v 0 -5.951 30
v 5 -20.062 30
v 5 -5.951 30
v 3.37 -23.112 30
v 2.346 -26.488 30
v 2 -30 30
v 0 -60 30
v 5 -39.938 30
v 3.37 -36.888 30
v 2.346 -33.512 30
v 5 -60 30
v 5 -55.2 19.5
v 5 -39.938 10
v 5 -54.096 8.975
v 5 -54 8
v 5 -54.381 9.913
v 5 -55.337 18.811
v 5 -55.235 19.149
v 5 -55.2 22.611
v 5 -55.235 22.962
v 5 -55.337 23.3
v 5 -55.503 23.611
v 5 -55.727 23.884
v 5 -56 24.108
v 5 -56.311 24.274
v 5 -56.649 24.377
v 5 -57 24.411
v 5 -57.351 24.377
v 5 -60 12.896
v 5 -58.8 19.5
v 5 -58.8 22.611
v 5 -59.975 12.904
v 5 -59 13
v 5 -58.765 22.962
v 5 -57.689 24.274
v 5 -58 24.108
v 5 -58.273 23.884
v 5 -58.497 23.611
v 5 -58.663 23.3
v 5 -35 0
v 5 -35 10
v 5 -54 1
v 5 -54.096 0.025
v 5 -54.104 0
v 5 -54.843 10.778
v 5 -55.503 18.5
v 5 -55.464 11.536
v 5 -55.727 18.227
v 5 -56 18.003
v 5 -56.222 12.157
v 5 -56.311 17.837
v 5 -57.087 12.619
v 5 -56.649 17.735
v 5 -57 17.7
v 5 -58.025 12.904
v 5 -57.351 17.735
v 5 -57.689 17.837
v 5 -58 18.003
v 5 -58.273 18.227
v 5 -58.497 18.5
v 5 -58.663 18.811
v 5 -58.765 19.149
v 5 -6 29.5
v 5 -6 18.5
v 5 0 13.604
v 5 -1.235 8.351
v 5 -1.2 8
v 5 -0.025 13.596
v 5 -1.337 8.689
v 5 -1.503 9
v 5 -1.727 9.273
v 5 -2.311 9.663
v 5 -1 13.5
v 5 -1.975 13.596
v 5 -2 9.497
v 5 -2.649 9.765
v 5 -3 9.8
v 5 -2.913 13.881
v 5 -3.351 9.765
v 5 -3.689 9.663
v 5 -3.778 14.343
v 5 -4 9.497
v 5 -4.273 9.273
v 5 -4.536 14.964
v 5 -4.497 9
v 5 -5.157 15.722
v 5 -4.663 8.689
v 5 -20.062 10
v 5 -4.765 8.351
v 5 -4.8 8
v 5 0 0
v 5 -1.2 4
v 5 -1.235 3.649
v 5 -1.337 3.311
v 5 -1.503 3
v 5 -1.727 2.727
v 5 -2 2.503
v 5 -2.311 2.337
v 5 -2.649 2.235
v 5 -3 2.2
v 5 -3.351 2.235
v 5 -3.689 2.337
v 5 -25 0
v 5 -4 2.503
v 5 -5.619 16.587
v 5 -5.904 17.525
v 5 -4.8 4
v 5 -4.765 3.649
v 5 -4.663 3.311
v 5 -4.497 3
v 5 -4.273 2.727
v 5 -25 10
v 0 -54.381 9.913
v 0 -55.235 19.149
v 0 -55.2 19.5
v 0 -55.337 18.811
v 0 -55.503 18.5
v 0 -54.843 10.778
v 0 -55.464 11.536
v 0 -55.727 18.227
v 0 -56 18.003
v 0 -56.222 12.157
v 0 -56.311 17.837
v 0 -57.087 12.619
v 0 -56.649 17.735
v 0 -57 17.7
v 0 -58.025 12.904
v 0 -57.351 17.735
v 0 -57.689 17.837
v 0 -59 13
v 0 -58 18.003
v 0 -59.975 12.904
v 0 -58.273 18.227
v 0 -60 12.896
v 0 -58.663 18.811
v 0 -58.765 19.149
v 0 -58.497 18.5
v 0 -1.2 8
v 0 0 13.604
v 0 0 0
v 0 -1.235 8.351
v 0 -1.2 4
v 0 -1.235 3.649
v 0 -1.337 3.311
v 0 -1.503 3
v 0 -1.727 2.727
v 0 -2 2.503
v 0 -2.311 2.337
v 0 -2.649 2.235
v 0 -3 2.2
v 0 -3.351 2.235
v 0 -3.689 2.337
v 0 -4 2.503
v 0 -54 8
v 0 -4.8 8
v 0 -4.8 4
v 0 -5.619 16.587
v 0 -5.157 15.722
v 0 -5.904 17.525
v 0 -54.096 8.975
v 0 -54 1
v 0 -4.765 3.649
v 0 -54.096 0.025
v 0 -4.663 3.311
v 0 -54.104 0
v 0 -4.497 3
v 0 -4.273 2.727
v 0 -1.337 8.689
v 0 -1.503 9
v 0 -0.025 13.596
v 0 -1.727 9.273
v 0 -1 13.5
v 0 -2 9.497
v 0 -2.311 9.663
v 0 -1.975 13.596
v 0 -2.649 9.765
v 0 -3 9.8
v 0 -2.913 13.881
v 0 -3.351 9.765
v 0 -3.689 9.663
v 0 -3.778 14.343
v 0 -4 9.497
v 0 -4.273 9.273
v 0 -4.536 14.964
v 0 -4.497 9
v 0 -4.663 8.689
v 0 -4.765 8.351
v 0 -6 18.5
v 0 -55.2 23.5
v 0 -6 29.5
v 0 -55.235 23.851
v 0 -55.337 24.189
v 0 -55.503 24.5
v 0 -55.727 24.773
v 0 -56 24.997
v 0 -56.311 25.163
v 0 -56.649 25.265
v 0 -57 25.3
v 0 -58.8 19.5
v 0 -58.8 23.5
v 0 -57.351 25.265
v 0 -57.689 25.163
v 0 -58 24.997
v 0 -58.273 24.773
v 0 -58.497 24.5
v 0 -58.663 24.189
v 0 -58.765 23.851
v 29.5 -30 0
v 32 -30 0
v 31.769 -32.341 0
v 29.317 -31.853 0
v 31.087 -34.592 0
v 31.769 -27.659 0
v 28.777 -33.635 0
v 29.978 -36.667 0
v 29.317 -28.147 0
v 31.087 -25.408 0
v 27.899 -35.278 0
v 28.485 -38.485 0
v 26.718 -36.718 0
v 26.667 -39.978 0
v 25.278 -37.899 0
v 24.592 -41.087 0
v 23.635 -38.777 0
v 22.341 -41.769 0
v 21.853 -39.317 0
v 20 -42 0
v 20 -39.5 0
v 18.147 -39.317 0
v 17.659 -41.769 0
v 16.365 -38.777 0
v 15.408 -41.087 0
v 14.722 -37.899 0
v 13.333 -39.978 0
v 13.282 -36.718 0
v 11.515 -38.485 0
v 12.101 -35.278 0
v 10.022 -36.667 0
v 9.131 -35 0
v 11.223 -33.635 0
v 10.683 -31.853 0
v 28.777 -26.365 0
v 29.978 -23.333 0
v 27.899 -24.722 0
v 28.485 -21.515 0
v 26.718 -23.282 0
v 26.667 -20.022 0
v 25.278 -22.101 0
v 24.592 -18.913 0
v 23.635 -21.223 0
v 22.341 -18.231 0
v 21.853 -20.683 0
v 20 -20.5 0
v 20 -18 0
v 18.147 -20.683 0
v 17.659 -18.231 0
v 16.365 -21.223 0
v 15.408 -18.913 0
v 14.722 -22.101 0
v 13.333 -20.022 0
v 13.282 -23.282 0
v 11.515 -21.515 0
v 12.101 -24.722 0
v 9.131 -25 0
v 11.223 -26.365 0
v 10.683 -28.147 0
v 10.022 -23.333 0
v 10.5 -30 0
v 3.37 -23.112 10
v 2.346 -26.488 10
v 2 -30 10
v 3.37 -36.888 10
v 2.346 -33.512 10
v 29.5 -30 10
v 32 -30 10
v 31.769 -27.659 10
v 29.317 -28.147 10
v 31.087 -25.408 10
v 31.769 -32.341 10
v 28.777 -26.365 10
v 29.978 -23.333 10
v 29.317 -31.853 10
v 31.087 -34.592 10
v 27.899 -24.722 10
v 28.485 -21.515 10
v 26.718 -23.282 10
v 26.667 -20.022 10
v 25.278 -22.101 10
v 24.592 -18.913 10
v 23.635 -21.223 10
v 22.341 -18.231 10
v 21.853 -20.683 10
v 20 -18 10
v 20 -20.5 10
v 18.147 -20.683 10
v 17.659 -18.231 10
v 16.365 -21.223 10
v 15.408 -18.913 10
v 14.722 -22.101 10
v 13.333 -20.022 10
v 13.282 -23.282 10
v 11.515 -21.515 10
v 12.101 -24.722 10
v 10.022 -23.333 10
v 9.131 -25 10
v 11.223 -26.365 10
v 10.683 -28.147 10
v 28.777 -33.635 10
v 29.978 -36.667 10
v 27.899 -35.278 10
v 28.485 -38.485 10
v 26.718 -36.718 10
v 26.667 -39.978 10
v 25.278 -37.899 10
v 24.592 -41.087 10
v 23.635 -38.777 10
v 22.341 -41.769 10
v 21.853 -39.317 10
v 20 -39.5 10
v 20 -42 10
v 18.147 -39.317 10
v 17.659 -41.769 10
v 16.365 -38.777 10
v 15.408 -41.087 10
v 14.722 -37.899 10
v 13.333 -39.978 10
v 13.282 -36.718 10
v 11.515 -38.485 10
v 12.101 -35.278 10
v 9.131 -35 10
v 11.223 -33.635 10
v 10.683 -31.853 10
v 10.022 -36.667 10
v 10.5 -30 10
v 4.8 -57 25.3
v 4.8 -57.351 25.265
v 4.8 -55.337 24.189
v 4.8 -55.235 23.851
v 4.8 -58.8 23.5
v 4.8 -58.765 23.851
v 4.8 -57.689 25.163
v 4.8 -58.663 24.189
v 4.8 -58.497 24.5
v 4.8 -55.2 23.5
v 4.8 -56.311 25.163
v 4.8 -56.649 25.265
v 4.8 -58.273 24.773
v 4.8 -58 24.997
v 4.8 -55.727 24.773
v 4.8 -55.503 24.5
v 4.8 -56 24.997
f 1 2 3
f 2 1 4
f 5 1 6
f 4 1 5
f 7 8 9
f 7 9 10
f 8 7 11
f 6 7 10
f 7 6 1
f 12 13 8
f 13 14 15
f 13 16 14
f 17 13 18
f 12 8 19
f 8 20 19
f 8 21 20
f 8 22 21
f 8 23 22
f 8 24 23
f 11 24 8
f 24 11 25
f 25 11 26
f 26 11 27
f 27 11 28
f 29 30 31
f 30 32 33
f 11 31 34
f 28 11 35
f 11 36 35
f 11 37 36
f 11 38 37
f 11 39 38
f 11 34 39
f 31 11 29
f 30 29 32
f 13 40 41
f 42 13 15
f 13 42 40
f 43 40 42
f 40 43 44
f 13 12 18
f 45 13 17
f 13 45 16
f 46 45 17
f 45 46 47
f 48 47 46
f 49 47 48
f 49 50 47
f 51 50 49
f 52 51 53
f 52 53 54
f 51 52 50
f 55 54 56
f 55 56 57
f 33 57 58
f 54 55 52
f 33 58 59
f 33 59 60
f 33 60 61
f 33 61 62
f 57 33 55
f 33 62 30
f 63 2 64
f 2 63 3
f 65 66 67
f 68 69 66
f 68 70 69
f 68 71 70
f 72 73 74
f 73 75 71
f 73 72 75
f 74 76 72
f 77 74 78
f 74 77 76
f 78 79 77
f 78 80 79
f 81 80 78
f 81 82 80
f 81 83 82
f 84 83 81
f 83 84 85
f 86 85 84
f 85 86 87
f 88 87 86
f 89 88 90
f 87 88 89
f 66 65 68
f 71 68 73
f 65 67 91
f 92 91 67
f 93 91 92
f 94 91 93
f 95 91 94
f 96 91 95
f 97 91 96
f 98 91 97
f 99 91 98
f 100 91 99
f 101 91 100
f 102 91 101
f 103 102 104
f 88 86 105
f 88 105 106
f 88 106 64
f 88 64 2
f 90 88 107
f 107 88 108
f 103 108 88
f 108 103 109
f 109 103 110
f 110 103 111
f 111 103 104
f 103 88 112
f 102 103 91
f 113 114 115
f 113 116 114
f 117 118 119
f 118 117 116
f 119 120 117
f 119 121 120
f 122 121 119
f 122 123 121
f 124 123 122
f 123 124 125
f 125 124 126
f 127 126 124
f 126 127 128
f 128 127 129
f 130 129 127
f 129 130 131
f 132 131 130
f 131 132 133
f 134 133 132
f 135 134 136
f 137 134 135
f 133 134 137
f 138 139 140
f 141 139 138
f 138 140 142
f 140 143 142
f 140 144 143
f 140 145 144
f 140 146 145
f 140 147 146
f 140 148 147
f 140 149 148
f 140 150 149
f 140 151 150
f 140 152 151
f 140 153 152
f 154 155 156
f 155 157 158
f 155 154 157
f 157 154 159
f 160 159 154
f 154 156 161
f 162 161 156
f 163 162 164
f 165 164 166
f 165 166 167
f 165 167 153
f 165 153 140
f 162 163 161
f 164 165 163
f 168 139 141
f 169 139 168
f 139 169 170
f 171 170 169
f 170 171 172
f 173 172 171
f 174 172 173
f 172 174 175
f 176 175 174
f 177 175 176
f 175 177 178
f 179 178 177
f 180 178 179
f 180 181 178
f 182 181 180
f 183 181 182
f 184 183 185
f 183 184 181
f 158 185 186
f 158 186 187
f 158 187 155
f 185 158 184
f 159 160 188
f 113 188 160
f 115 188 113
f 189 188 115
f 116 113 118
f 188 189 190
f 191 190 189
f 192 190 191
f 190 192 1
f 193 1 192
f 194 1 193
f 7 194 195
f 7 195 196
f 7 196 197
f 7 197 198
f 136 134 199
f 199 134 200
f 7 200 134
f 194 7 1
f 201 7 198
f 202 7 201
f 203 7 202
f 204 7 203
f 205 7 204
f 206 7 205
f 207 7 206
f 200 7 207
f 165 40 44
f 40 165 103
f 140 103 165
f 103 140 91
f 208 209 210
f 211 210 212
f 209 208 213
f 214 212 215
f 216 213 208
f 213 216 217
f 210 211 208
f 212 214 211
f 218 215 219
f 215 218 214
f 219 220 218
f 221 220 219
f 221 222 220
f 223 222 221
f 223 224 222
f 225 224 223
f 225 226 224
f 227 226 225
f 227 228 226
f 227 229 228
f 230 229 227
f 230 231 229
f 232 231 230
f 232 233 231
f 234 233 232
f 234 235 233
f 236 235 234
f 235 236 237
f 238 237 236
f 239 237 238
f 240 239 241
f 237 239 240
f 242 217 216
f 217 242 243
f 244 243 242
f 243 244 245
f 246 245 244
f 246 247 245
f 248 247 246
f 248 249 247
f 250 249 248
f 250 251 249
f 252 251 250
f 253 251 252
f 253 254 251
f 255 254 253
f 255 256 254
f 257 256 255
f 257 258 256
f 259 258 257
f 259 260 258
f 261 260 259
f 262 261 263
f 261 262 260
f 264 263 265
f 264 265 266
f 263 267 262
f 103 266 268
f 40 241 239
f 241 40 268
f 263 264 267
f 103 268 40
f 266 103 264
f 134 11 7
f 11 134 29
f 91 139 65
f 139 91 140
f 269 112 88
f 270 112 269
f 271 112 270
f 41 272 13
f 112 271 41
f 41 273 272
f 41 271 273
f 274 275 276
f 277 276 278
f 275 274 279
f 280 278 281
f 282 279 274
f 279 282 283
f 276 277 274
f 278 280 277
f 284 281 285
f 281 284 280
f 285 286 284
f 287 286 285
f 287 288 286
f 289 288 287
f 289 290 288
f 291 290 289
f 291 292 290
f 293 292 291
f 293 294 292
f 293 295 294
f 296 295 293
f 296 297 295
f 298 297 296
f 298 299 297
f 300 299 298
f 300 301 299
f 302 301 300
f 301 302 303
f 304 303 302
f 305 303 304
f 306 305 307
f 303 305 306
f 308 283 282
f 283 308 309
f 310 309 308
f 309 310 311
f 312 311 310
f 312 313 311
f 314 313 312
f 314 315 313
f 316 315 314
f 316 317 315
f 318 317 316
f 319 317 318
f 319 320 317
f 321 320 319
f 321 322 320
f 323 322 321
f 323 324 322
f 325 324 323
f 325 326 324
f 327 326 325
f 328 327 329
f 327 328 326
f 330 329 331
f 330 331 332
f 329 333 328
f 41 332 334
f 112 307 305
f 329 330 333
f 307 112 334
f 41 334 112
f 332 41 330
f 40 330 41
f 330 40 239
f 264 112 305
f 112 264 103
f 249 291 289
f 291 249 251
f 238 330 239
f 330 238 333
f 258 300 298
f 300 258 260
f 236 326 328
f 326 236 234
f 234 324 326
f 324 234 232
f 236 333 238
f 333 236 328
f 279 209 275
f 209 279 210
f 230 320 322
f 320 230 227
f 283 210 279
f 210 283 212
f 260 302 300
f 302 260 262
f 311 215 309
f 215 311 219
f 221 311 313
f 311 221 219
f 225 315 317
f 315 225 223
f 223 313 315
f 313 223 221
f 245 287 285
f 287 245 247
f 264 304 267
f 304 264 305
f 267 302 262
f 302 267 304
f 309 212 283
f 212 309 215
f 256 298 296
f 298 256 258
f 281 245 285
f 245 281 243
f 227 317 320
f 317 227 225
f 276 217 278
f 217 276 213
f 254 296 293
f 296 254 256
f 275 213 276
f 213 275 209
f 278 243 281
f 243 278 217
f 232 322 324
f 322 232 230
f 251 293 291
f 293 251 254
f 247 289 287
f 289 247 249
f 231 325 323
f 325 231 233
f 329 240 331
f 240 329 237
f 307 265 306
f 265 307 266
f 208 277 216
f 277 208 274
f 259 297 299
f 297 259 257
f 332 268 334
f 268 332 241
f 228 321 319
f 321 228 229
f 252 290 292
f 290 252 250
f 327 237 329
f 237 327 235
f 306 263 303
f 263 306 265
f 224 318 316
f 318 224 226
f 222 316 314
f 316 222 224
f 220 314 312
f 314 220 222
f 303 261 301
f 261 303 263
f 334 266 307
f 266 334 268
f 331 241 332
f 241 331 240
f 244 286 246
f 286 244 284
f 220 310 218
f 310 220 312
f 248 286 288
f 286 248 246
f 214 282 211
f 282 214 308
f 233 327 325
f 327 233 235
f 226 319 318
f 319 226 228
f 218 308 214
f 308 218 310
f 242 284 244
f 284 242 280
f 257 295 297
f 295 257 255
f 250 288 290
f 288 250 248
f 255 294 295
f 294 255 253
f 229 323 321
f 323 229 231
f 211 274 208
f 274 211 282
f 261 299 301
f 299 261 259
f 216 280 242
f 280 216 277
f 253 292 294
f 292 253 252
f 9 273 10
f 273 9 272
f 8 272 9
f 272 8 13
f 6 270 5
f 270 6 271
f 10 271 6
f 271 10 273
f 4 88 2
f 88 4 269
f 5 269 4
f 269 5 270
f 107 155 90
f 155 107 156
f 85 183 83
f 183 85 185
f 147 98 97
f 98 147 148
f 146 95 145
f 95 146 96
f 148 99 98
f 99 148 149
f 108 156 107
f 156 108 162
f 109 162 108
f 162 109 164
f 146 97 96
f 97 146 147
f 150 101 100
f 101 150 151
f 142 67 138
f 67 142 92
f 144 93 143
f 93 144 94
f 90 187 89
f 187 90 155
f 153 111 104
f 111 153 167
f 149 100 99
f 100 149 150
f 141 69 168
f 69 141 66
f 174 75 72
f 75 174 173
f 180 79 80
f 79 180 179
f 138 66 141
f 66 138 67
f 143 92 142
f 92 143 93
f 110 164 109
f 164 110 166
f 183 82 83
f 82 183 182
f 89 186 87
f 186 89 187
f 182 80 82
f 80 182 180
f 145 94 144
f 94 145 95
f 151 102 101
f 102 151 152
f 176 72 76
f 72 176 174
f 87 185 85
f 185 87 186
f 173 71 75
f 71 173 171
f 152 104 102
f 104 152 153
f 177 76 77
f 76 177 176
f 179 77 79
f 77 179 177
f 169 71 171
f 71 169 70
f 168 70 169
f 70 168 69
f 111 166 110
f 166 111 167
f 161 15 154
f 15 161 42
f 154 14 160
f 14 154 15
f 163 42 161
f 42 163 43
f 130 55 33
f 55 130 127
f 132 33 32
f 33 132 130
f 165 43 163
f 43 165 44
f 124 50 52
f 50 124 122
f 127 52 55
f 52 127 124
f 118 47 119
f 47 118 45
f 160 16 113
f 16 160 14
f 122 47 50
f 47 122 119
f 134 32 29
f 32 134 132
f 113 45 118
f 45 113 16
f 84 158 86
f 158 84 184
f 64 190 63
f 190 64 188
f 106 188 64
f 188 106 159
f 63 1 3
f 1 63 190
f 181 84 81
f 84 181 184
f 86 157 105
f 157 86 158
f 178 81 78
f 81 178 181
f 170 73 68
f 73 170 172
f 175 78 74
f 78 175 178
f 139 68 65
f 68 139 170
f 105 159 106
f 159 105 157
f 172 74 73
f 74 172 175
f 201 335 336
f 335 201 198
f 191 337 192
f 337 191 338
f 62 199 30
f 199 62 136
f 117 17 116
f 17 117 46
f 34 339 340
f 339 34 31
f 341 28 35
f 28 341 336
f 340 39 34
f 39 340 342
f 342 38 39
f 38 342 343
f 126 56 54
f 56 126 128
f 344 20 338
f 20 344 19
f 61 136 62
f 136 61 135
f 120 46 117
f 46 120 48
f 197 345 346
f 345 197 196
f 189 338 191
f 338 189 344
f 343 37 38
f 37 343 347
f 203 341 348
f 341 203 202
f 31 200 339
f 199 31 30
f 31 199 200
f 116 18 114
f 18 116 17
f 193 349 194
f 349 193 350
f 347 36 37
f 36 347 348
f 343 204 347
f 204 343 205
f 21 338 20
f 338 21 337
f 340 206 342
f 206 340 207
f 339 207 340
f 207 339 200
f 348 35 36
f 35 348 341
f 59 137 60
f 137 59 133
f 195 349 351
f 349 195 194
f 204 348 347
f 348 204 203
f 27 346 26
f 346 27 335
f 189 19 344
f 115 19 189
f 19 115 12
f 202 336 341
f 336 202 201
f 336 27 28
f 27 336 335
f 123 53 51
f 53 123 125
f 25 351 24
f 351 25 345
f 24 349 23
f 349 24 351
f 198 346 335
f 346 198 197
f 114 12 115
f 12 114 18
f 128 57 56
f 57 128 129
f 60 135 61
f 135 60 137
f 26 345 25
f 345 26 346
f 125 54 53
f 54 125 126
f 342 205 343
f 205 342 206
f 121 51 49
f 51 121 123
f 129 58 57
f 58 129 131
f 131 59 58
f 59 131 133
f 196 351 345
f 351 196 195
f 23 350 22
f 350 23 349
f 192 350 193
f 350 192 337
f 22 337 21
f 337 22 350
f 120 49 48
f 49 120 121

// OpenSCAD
// file: dual_hotend_v2.01.scad
//!openscad
//include <configuration.scad>
module assembly(hotend, fan, sensor){
mount(hotend,fan);
hotends(hotend);
clamp(hotend, fan, sensor);
fans();
sensor();
}
module mount(hotend, fan) {
 color("green")
 difference() {
	union(){ //Main Mount Bracket
		if (fan==1) {
			translate([28, -1, 0]) cube([7.75, 62, 15] );
	
		}
		if (fan==0) {
			translate([28, -6, 0]) cube([7.75, 72, 15]);
		};
			cube([30, 60, 5] );
	}
		translate([5, 10, -.1]) cube([20, 40, 5.2]); //open back	
	//lower mount screw holes
	hull(){
		translate([4, 3 , -.1]) cylinder(r = 1.8, h= 5.5); 
		translate([8, 3, -.1]) cylinder(r= 1.8, h= 5.5);
};
  hull() {
	translate([8, 57, -.1]) cylinder(r = 1.8, h=5.5);	
	translate([4, 57, -.1]) cylinder(r = 1.8, h=5.5);
};
	//upper mount screw holes
hull() {
		translate([19.5, 3, -.1]) cylinder(r=1.8, h=5.5);
		translate([23.5, 3, -.1]) cylinder(r=1.8, h=5.5);
};		
hull() {
translate([23.5, 57, -1]) cylinder(r=1.8, h=5.8);
translate([19.5, 57, -.1]) cylinder(r=1.8, h=5.8);
};
		//hot end fin releif
		if (hotend==1) {
  
	};
//hotend mount holes
		if (hotend==0) {
 		translate([-.1, 15, 15]) rotate([0, 90, 0]) cylinder(r = 13.5, h=27);
		translate([-.1, 45, 15]) rotate([0, 90, 0]) cylinder(r=13.5, h=27);
		translate([27.9, 45, 15])rotate([0, 90, 0]) cylinder(r=8.1, h=2.5);
		translate([27.9, 15, 15])rotate([0, 90, 0]) cylinder(r=8.1, h=2.5);
		translate([27.9, 15, 15])rotate([0, 90, 0]) cylinder(r=6, h=10);
		translate([27.9, 45, 15])rotate([0, 90, 0]) cylinder(r=6, h=10);
		};	
		if (hotend==1) {
 		translate([-.1, 15, 15]) rotate([0, 90, 0]) cylinder(r = 13.5, h=27);
		translate([-.1, 45, 15]) rotate([0, 90, 0]) cylinder(r=13.5, h=27);
		translate([27.9, 45, 15])rotate([0, 90, 0]) cylinder(r=8.1, h=4.6);
		translate([27.9, 15, 15])rotate([0, 90, 0]) cylinder(r=8.1, h=4.6);
		translate([27.9, 15, 15])rotate([0, 90, 0]) cylinder(r=6.0, h=12);
		translate([27.9, 45, 15])rotate([0, 90, 0]) cylinder(r=6, h=10);
		};
//clamp screw holes
translate([32, 56, -.1]) cylinder(r=1.55, h=30);
translate([32, 4, -.1]) cylinder(r=1.55, h=30);
	}
}
module clamp(hotend, fan, sensor) {//outer clamp
color("purple")
difference() {

union() {
//if (sensor==1) {
//translate([28, 30, 48])rotate([0, 90, 0]) cylinder(r=10, h=7.75);
//};
//if (sensor==0) {
//translate([28, 30, 48])rotate([0, 90, 0]) //cylinder(r=12, h=7.75);
//}
//translate([28, 25, 25])cube([7.75, 10, 18]);
if (fan==0) {
translate([28, -6, 15.1])cube([7.75, 72, 12]);
//fanmount
translate([16, -6, 15.1])cube([12, 72, 12]);
translate([16, 25, 15.1])cube([10, 5, 12]);
}
if (fan==1) {
translate([28, -1, 15.1])cube([7.75, 62, 12]);
//fanmount
translate([16, -1, 15.1])cube([12, 62, 12]);
translate([16, 25, 15.1])cube([10, 5, 12]);
}
}
color("pink")

//hotend mount holes
		if (hotend==0) {
 		translate([-.1, 15, 15]) rotate([0, 90, 0]) cylinder(r = 13.5, h=27);
		translate([-.1, 45, 15]) rotate([0, 90, 0]) cylinder(r=13.5, h=27);
		translate([27.9, 45, 15])rotate([0, 90, 0]) cylinder(r=8.2, h=2.5);
		translate([27.9, 15, 15])rotate([0, 90, 0]) cylinder(r=8.2, h=2.5);
		translate([27.9, 15, 15])rotate([0, 90, 0]) cylinder(r=6.2, h=10);
		translate([27.9, 45, 15])rotate([0, 90, 0]) cylinder(r=6.2, h=10);
		};	
		if (hotend==1) {
 		translate([-.1, 15, 15]) rotate([0, 90, 0]) cylinder(r = 13.5, h=27);
		translate([-.1, 45, 15]) rotate([0, 90, 0]) cylinder(r=13.5, h=27);
		translate([27.9, 45, 15])rotate([0, 90, 0]) cylinder(r=8.1, h=4.6);
		translate([27.9, 15, 15])rotate([0, 90, 0]) cylinder(r=8.1, h=4.6);
		translate([27.9, 15, 15])rotate([0, 90, 0]) cylinder(r=6.0, h=12);
		translate([27.9, 45, 15])rotate([0, 90, 0]) cylinder(r=6, h=10);
		};
//sensor mount
//if (sensor==0) {
//translate([27.9, 30, 48]) rotate([0, 90, 0]) cylinder(r=9.1, h=10);
//};
//if (sensor==1) {
//translate([27.9, 30, 48]) rotate([0, 90, 0]) cylinder(r=6.1, h=10);
//translate([32, 30, 48]) cylinder(r=1.55, h=20);
//translate([32, 4, 0]) cylinder(r=1.55, h=30);
//};
//sensor clamp screw 
translate([32, 30, 48]) cylinder(r=1.55, h=30);
//clamp screw holes

translate([32, 4, 0]) cylinder(r=1.75, h=30);

translate([32, 56, 0]) cylinder(r=1.75, h=30);
//fan mount screw holes
if (fan==1) {
translate([20.5, 2.5, 10]) cylinder(r=1.55, h=30);
translate([20.5, 26.5, 10]) cylinder(r=1.55, h=30);
translate([20.5, 33.5, 10]) cylinder(r=1.55, h=30);
translate([20.5, 57.5, 10]) cylinder(r=1.55, h=30);
}
if (fan==0) {
translate([20.5, 2.5, 10]) cylinder(r=1.55, h=30);
translate([20.5, 32.5, 10]) cylinder(r=1.55, h=30);
translate([20.5, 33.5, 10]) cylinder(r=1.55, h=30);
translate([20.5, 57.5, 10]) cylinder(r=1.55, h=30);
}
//clamp holes
//fin releif
	
   translate([-.1, 15, 15]) rotate([0, 90, 0]) cylinder(r = 13., h=28.05);//hot end fin releif
	translate([-.1, 45, 15]) rotate([0, 90, 0]) cylinder(r=13., h=28.05);//hot end fin relief

}
}
module back_support(hotend, fan) {
 color("red")
 difference() {
	union(){ //Main Mount Bracket
		if (fan==1) {
			//translate([28, -1, 0]) cube([7.75, 62, 15] );
	
		}
		if (fan==0) {
			//translate([28, -6, 0]) cube([7.75, 72, 15]);
		};
			cube([30, 60, 5] );
			translate([0,25,5]) cube([10, 10, 10]);
translate([0,30,20]) rotate([0, 90 , 0]) cylinder(r=12, h=10);
	} 
//sensor holes
translate([-.1,30,20]) rotate([0, 90, 0]) cylinder(r=9.5, h=10.5);
translate([10, 30, 20]) rotate([0, 90, 0]) cylinder(r=18, h=35);
		//translate([-.1, 10, -.1]) cube([25, 40, 5.2]); //open back	
	//lower mount screw holes
	hull(){
		translate([4, 3 , -.1]) cylinder(r = 1.8, h= 5.5); 
		translate([8, 3, -.1]) cylinder(r= 1.8, h= 5.5);
};
  hull() {
	translate([8, 59, -.1]) cylinder(r = 5, h=5.5);	
	translate([1, 59, -.1]) cylinder(r = 5, h=5.5);
};
	//upper mount screw holes
hull() {
		translate([18.5, 1, -.1]) cylinder(r=5, h=5.5);
		translate([29.5, 1, -.1]) cylinder(r=5, h=5.5);
};		
hull() {
translate([23.5, 57, -1]) cylinder(r=1.8, h=5.8);
translate([19.5, 57, -.1]) cylinder(r=1.8, h=5.8);
};
		//hot end fin releif
		if (hotend==1) {
  
	};
//hotend mount holes
//		if (hotend==0) {
// 		translate([-.1, 15, 15]) rotate([0, 90, 0]) cylinder(r = 13.5, h=27);
//		translate([-.1, 45, 15]) rotate([0, 90, 0]) cylinder(r=13.5, h=27);
//		translate([27.9, 45, 15])rotate([0, 90, 0]) cylinder(r=8.1, h=2.5);
//		translate([27.9, 15, 15])rotate([0, 90, 0]) cylinder(r=8.1, h=2.5);
//		translate([27.9, 15, 15])rotate([0, 90, 0]) cylinder(r=6, h=10);
//		translate([27.9, 45, 15])rotate([0, 90, 0]) cylinder(r=6, h=10);
//		};	
//		if (hotend==1) {
// 		translate([-.1, 15, 15]) rotate([0, 90, 0]) cylinder(r = 13.5, h=27);
//		translate([-.1, 45, 15]) rotate([0, 90, 0]) cylinder(r=13.5, h=27);
//		translate([27.9, 45, 15])rotate([0, 90, 0]) cylinder(r=8.1, h=4.6);
//		translate([27.9, 15, 15])rotate([0, 90, 0]) cylinder(r=8.1, h=4.6);
//		translate([27.9, 15, 15])rotate([0, 90, 0]) cylinder(r=6.0, h=12);
//		translate([27.9, 45, 15])rotate([0, 90, 0]) cylinder(r=6, h=10);
//		};
//clamp screw holes
translate([32, 56, -.1]) cylinder(r=1.55, h=30);
translate([32, 4, -.1]) cylinder(r=1.55, h=30);
	}
}
// main file
//hotend config file

hotend=0 ;//0 for e3d mount  1 for j-head
fan=1; //0 for 40mm 1 for 30mm
sensor=0; //0 for 18mm 1 for 12mm
view=2; // 0 for assembly 1 for print

if (view==2) {
rotate([0, -90, 180]) back_support(hotend, fan);
};
if (view==1) {
mount(hotend, fan);
translate([-40, 1, 36])rotate([0, 90, 0])clamp(hotend, fan, sensor);
translate([40, 60, 0])rotate([0,-90, 180]) back_support(hotend, fan);
};
if (view==0) {
mount(hotend, fan);
clamp(hotend, fan, sensor);
hotends(hotend);
fans();
sensor(sensor);
};
//mount(hotend,fan);
//hotends(hotend);
//clamp(hotend, fan, sensor);

include <dual_hotend_v2.01.scad>
module hotends(hotend) {
		if (hotend==0) {
	color("silver")
		translate([43, 15, 15]) rotate([90, 90, -90]) import("e3d_hotend.stl");
	color("silver")
		translate([43, 45, 15]) rotate([90, -90, -90]) import("e3d_hotend.stl");
	};
	if (hotend==1) {
	color("silver")
	translate([41, 15, 15]) rotate([90, 180, -90]) import("jhead.stl");
color("silver")
	translate([41, 45, 15]) rotate([90, 180, -90]) import("jhead.stl");
};
}
module fans() {
	color("black")
		translate([-8, -.5, 27.15]) scale(1) import("30mm_fan.stl");
	color("black")
		translate([-8, 30, 27.15]) import("30mm_fan.stl");
}


module sensor(){
	
	if (sensor==0) {
		color("blue")
		translate([-25, 30, 48]) rotate([0, 90, 0])cylinder(r=9, h=68);
   	};
 	if (sensor==1) {
		color("cyan")
		translate([-25, 30, 48]) rotate([0, 90, 0])cylinder(r=6, h=60);
		}
}
//sensor();
$fn=32;
